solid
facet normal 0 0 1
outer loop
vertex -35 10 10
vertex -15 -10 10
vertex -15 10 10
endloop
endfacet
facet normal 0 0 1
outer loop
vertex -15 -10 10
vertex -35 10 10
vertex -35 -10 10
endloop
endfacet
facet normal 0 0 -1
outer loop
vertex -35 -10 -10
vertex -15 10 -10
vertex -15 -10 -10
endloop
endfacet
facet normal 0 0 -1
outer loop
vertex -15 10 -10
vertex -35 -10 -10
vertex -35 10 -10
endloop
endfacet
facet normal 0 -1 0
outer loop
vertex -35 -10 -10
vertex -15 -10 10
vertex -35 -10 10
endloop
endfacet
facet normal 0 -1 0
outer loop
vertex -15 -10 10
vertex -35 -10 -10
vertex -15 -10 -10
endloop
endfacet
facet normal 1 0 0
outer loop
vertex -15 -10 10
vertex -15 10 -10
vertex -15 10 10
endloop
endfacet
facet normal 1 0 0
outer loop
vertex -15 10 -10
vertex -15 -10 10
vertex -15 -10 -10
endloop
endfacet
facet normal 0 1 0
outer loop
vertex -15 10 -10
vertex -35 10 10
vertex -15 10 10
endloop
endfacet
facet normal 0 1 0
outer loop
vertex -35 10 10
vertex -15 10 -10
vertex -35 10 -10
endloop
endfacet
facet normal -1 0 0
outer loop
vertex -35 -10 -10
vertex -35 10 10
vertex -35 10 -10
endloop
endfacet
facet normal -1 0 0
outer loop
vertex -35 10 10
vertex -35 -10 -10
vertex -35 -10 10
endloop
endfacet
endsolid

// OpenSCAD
module included(s) {
  translate([-25,0,0]) cube(s, center=true);
}
color("Green") included(20);
